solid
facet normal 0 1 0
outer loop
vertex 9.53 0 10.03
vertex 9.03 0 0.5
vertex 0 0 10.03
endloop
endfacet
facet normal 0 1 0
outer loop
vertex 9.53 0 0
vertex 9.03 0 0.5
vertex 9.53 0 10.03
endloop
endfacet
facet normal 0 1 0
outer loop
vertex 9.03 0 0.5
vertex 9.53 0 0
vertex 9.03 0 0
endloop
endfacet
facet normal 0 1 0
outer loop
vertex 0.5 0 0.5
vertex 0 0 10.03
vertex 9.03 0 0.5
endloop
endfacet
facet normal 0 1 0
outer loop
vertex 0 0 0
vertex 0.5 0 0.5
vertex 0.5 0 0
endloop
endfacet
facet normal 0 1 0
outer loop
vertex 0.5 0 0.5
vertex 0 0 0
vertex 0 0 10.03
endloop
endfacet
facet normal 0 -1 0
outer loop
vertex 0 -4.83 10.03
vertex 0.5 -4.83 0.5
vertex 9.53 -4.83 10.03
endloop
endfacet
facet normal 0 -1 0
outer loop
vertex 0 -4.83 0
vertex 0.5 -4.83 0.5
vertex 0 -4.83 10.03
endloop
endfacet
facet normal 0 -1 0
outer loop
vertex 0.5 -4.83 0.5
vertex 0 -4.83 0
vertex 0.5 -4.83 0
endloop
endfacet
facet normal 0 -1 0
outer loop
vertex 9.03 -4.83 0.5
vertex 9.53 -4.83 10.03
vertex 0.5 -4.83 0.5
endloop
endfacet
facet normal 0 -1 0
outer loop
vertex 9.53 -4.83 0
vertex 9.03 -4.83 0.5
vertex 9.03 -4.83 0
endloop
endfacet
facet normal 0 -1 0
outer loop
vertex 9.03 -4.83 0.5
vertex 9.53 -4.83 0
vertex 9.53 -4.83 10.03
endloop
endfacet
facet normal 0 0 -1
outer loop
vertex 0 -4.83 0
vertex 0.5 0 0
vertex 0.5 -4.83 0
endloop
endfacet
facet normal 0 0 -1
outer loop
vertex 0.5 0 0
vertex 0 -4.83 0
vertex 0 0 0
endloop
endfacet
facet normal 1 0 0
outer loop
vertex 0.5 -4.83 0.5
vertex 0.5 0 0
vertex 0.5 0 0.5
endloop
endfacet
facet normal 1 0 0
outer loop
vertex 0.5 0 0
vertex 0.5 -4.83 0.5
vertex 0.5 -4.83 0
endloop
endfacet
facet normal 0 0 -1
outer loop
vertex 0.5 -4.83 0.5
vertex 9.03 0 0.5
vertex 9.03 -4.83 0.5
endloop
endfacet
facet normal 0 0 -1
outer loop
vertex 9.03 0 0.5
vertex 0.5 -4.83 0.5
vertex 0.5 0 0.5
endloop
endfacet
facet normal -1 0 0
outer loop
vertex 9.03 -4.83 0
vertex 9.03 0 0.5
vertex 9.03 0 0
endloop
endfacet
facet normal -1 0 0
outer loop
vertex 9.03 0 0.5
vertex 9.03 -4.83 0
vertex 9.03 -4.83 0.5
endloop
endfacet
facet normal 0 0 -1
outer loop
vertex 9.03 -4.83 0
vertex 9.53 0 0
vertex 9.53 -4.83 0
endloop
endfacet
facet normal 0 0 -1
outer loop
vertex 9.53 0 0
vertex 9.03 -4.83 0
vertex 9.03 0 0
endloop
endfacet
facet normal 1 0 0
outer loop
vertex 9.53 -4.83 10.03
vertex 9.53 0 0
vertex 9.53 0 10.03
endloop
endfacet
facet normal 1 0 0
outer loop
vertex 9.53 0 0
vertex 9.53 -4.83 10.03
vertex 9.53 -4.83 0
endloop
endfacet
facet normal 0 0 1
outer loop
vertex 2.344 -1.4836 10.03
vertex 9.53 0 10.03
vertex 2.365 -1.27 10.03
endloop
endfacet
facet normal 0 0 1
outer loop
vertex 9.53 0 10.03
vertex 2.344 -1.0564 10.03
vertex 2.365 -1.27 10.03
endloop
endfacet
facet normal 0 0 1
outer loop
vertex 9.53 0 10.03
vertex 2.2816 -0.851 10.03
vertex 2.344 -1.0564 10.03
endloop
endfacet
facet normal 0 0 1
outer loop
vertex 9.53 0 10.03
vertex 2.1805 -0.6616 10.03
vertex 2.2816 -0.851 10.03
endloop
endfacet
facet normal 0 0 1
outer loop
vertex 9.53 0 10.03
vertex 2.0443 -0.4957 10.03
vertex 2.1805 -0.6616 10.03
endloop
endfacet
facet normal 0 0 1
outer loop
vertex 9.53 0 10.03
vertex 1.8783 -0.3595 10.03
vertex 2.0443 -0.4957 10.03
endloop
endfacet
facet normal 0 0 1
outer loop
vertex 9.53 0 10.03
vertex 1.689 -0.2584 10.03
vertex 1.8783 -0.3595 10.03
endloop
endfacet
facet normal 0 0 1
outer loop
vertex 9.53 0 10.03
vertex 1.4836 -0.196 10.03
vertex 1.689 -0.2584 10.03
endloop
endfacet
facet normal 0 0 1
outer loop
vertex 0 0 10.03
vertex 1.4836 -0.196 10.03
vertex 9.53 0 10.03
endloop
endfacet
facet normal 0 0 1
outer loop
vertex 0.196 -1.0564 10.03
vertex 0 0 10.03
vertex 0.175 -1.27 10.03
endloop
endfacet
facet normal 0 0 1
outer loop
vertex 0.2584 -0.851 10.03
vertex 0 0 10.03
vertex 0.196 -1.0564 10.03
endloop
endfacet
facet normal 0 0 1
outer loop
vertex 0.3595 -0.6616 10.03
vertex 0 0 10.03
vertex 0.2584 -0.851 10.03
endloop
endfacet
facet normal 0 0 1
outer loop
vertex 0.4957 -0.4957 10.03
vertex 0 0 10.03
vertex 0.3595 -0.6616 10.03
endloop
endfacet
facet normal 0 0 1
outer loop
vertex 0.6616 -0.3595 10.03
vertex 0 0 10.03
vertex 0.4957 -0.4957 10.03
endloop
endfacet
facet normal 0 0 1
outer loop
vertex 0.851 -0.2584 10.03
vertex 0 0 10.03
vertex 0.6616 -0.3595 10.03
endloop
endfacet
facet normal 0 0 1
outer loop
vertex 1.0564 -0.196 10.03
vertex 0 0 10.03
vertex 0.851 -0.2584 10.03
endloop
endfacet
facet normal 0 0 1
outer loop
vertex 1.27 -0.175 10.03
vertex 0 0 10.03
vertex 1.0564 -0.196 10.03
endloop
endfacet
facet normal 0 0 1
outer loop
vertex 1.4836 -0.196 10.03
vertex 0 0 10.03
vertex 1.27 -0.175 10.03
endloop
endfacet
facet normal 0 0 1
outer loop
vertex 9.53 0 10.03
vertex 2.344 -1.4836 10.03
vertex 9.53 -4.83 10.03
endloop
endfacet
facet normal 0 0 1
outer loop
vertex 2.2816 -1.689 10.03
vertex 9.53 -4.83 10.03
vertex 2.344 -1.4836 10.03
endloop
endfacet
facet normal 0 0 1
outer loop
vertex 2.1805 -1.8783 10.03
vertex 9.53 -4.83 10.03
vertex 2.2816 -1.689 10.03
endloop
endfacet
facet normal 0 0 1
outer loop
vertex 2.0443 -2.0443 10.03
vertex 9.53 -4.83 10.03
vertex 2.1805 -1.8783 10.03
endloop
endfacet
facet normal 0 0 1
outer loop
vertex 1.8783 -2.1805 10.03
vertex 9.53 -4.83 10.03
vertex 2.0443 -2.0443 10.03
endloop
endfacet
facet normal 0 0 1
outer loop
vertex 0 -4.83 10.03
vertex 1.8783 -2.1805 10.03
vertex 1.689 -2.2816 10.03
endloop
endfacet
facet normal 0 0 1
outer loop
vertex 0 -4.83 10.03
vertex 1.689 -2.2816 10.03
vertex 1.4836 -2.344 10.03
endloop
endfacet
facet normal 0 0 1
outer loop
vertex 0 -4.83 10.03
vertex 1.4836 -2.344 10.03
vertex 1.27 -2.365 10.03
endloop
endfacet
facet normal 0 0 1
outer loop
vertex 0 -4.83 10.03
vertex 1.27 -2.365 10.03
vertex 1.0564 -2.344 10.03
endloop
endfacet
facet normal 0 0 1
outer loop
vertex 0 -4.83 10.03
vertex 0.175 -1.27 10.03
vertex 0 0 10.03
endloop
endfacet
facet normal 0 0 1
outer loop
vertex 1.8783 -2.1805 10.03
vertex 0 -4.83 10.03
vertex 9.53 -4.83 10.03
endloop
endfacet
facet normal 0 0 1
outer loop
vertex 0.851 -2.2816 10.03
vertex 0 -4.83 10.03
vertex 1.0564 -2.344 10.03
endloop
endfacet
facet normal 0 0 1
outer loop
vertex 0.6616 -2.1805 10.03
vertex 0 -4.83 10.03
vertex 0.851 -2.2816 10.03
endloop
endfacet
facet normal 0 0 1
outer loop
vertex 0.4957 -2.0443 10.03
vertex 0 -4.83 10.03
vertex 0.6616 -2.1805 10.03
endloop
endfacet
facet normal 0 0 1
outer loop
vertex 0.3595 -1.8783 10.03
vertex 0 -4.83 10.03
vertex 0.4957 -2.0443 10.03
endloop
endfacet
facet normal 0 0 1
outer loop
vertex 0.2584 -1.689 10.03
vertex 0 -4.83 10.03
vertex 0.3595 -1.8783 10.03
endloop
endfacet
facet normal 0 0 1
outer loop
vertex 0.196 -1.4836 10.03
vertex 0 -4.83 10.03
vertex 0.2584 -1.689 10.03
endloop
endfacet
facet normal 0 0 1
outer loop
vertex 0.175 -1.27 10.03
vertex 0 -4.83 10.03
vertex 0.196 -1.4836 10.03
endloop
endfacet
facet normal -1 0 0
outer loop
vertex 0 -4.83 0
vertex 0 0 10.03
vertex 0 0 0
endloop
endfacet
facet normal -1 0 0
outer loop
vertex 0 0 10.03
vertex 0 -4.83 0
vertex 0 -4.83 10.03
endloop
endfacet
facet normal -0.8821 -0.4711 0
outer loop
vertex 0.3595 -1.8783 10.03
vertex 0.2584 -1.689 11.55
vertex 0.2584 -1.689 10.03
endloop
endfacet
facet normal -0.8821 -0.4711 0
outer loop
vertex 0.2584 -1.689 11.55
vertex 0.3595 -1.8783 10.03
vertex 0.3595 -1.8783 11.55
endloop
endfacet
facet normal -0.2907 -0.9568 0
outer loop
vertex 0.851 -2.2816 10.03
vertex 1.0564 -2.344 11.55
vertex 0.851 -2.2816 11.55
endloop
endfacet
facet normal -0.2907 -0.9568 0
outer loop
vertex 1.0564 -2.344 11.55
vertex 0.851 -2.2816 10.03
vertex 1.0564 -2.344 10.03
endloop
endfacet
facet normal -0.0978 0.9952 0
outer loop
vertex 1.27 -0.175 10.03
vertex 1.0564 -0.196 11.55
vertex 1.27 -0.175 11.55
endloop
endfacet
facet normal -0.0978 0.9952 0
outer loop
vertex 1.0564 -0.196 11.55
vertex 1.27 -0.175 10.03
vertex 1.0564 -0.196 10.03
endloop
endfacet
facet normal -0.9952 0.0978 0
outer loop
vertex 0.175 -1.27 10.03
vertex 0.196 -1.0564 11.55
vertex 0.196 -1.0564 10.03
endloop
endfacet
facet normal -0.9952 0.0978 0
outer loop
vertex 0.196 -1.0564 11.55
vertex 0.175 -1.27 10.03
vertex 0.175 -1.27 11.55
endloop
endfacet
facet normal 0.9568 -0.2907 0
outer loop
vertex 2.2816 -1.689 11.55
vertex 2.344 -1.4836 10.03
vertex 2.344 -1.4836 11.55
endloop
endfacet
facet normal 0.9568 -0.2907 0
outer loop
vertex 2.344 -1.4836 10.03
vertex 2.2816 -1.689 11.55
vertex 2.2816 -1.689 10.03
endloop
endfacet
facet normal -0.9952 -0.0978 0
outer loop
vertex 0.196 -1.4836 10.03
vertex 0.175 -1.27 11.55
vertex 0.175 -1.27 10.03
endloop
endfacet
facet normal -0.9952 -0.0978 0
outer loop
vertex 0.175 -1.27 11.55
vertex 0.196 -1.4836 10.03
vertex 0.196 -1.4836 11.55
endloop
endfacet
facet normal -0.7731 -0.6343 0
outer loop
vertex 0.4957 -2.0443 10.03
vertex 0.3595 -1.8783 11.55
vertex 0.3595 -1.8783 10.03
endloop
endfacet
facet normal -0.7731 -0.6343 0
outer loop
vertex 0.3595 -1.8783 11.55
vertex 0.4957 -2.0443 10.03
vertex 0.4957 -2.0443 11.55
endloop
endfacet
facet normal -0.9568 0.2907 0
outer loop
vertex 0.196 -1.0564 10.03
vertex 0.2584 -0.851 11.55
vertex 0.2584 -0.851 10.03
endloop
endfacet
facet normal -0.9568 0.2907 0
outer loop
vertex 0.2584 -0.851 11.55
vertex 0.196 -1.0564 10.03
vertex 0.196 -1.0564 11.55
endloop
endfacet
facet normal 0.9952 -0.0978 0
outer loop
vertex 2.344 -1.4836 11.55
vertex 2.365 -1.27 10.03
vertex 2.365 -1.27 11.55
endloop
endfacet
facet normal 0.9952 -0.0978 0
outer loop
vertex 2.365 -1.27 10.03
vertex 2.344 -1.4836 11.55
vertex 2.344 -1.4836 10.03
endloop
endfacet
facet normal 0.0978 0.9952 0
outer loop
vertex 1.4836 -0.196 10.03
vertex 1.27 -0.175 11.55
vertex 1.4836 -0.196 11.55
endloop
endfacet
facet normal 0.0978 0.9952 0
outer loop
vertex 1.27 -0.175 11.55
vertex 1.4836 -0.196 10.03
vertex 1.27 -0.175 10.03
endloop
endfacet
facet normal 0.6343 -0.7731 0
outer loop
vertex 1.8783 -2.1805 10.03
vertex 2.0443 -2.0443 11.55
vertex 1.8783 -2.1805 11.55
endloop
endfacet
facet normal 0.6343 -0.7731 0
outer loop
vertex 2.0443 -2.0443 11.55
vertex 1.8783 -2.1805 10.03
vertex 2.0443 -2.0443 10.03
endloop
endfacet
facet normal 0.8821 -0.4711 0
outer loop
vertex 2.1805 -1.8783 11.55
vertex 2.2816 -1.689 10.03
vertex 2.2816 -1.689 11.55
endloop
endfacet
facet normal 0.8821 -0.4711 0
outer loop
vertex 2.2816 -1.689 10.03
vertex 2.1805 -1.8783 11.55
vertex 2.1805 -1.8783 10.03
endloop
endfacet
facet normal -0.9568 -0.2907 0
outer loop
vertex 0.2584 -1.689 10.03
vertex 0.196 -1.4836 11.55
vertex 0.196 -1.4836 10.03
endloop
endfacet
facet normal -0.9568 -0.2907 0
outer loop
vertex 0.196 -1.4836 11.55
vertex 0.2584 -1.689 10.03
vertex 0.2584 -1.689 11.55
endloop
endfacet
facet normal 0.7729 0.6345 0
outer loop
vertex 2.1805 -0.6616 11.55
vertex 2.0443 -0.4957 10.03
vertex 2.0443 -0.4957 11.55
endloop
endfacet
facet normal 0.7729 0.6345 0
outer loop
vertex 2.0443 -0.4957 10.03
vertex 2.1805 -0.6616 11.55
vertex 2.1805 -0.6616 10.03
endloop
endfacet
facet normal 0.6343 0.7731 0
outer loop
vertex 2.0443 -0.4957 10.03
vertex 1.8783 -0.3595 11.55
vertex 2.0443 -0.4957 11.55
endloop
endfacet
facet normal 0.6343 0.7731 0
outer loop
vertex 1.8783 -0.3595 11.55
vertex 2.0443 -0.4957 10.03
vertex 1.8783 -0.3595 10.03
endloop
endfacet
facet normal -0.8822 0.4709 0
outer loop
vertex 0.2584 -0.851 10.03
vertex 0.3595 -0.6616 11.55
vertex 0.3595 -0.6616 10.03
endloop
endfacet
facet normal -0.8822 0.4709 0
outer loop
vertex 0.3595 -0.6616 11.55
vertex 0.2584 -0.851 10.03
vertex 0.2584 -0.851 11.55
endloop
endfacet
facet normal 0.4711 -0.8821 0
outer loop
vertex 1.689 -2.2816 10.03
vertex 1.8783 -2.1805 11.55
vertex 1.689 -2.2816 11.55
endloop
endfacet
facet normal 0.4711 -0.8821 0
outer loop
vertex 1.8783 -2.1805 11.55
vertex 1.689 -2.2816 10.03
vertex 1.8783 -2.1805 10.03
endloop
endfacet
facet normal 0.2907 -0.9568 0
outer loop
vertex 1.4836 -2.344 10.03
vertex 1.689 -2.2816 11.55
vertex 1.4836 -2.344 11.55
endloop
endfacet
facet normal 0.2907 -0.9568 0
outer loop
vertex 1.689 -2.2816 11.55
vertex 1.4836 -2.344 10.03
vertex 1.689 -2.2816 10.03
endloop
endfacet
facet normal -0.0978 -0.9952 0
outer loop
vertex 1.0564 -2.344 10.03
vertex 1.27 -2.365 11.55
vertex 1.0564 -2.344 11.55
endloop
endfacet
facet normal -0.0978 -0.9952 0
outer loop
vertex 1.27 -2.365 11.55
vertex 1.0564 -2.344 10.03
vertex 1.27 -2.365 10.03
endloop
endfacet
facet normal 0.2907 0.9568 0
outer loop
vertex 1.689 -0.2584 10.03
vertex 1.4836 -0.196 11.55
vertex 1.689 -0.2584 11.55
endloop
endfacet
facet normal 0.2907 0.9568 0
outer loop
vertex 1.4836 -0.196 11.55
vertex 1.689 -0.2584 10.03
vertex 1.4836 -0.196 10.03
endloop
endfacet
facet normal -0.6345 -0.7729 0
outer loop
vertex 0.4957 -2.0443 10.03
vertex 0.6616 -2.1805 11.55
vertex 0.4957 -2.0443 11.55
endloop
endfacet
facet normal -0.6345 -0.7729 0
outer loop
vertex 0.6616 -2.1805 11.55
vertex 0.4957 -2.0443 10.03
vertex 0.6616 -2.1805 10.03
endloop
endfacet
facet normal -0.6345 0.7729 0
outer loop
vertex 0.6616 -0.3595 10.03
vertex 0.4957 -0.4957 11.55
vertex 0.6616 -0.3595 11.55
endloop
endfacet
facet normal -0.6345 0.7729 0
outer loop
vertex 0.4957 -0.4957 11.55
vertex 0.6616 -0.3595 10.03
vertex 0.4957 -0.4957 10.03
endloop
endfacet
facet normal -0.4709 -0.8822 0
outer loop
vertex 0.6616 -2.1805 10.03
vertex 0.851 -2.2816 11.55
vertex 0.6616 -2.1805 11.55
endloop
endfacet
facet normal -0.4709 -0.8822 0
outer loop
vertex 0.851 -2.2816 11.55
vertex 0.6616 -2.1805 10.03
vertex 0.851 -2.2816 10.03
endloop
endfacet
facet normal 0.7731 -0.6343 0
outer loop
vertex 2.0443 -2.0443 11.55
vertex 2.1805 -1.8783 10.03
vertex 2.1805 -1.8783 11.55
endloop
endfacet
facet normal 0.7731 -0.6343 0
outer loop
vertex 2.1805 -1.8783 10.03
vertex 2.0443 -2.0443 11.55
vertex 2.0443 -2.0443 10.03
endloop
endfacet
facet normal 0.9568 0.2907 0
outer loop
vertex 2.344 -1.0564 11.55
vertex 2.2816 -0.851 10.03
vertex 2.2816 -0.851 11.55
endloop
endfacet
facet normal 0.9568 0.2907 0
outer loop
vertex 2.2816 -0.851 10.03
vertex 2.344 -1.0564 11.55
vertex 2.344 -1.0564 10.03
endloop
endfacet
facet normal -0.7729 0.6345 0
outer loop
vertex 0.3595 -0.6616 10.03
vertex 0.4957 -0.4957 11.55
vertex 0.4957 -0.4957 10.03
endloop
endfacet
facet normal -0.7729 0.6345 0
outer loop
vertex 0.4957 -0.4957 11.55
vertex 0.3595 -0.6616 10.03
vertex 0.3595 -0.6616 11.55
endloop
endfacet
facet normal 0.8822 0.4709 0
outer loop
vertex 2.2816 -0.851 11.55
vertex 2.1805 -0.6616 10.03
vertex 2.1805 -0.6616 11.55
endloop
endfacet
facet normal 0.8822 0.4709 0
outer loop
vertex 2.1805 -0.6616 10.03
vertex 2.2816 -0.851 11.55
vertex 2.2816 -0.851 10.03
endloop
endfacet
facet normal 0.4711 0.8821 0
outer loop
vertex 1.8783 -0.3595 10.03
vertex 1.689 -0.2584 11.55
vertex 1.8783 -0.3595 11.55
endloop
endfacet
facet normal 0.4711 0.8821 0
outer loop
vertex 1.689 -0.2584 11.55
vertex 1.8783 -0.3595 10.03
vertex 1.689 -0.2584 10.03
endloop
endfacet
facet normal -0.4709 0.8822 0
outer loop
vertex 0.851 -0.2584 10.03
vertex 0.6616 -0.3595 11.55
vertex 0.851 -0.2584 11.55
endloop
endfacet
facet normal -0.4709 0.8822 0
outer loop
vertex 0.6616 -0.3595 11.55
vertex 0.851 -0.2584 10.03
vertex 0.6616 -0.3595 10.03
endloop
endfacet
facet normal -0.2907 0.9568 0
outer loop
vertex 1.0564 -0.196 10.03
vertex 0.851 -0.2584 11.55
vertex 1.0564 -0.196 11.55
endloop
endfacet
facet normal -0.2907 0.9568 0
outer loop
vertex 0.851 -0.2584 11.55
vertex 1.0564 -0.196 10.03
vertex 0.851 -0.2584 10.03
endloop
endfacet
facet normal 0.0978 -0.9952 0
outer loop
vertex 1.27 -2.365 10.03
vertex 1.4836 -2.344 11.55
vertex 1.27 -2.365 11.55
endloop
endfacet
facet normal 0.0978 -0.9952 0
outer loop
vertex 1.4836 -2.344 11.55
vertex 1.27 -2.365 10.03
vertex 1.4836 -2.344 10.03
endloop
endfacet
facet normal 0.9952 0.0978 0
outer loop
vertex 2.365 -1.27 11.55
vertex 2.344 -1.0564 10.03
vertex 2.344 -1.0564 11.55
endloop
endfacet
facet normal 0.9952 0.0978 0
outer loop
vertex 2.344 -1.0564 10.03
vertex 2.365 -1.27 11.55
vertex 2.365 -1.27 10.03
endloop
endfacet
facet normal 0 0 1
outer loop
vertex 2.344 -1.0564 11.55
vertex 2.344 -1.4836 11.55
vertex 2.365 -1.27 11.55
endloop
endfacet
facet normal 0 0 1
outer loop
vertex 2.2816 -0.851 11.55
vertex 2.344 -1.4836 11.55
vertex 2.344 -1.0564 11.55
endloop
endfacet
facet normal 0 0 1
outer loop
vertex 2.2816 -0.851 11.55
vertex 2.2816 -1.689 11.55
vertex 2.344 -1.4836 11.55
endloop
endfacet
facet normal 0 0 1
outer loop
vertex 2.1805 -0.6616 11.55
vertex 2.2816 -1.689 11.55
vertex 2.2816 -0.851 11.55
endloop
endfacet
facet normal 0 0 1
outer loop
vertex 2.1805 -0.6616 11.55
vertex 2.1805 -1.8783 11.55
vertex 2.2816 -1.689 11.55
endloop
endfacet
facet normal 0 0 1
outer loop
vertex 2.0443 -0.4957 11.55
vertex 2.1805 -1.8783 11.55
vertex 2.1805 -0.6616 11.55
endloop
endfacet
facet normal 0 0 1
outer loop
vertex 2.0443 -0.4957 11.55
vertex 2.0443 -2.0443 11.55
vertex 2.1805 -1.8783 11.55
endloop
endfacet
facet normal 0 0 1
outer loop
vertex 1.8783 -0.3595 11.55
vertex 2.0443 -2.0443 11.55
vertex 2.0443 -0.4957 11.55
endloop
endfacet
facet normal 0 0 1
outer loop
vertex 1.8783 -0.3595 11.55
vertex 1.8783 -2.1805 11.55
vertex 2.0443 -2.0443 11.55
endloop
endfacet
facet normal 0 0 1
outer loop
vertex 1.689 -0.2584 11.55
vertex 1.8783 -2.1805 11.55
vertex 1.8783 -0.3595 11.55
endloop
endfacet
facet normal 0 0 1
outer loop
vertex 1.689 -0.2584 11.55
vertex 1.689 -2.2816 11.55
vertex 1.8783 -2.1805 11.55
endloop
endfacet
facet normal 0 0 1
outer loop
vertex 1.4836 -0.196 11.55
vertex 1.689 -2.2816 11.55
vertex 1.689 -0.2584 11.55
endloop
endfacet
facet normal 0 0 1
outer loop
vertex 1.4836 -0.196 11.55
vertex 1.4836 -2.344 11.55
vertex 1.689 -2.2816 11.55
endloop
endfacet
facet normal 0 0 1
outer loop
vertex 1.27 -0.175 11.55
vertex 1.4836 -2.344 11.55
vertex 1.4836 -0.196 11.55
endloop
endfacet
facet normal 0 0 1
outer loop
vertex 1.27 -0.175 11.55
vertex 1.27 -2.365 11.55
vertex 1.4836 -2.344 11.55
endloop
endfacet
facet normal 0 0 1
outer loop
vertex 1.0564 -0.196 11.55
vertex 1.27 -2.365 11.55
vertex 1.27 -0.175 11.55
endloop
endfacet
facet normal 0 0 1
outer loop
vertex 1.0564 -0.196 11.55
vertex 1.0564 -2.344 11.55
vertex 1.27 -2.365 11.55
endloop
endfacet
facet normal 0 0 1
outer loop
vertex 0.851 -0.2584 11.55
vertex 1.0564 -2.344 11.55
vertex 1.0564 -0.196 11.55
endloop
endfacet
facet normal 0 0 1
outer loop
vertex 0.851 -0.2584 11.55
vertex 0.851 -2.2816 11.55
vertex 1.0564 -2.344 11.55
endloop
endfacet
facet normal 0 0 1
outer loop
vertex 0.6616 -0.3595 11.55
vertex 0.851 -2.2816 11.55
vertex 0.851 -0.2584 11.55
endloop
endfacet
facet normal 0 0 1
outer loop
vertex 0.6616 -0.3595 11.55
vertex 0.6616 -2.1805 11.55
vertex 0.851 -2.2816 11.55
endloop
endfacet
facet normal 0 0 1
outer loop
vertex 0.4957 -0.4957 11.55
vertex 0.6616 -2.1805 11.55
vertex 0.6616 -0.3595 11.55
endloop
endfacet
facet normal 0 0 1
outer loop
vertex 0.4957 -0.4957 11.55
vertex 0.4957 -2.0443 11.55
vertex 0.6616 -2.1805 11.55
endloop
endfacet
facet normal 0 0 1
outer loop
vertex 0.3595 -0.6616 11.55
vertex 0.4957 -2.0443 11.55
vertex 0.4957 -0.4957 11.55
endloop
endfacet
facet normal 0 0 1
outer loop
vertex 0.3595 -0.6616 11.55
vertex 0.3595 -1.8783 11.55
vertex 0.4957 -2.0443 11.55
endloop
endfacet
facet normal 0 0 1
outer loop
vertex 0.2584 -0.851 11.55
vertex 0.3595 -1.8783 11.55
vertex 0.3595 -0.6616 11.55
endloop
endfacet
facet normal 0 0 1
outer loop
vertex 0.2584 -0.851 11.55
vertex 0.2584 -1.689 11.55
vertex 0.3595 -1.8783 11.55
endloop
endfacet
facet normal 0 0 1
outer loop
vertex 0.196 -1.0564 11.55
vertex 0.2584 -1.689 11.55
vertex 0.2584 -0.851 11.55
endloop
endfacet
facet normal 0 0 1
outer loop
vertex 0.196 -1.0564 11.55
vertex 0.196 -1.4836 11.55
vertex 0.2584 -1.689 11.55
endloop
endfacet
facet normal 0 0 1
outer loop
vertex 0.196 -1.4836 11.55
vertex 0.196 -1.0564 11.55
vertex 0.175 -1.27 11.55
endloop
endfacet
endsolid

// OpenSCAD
// Start: lazy_union
default_5_default_5();
// End: lazy_union

// Modules.

// 'PartMaterial undef-default - default 5.0'
module default_5_default_5() {
  // 'None : _combine_solids_and_holes'
  union() {
    // 'default : _combine_solids_and_holes'
    union() {
      // 'trimpot'
      multmatrix(m=[[-1.0, -0.0, -0.0, 9.53], [-0.0, -0.0, -1.0, -0.0], [-0.0, -1.0, -0.0, 10.03], [0.0, 0.0, 0.0, 1.0]]) {
        // 'trimpot : _combine_solids_and_holes'
        union() {
          // 'trimpot'
          linear_extrude(height=4.83, twist=0.0, slices=4, scale=[1.0, 1.0], $fn=32) {
            polygon(points=[[0.0, 0.0], [9.53, 0.0], [9.53, 10.03], [9.03, 10.03], [9.03, 9.53], [0.5, 9.53], [0.5, 10.03], [0.0, 10.03]]);
          }
        }
      }
      // 'adj'
      multmatrix(m=[[-1.0, 0.0, 0.0, 1.27], [0.0, -1.0, 0.0, -1.27], [0.0, 0.0, 1.0, 10.03], [0.0, 0.0, 0.0, 1.0]]) {
        // 'adj : _combine_solids_and_holes'
        union() {
          // 'adj'
          cylinder(h=1.52, r1=1.095, r2=1.095, center=false, $fn=32);
        }
      }
    }
  }
} // end module default_5_default_5
